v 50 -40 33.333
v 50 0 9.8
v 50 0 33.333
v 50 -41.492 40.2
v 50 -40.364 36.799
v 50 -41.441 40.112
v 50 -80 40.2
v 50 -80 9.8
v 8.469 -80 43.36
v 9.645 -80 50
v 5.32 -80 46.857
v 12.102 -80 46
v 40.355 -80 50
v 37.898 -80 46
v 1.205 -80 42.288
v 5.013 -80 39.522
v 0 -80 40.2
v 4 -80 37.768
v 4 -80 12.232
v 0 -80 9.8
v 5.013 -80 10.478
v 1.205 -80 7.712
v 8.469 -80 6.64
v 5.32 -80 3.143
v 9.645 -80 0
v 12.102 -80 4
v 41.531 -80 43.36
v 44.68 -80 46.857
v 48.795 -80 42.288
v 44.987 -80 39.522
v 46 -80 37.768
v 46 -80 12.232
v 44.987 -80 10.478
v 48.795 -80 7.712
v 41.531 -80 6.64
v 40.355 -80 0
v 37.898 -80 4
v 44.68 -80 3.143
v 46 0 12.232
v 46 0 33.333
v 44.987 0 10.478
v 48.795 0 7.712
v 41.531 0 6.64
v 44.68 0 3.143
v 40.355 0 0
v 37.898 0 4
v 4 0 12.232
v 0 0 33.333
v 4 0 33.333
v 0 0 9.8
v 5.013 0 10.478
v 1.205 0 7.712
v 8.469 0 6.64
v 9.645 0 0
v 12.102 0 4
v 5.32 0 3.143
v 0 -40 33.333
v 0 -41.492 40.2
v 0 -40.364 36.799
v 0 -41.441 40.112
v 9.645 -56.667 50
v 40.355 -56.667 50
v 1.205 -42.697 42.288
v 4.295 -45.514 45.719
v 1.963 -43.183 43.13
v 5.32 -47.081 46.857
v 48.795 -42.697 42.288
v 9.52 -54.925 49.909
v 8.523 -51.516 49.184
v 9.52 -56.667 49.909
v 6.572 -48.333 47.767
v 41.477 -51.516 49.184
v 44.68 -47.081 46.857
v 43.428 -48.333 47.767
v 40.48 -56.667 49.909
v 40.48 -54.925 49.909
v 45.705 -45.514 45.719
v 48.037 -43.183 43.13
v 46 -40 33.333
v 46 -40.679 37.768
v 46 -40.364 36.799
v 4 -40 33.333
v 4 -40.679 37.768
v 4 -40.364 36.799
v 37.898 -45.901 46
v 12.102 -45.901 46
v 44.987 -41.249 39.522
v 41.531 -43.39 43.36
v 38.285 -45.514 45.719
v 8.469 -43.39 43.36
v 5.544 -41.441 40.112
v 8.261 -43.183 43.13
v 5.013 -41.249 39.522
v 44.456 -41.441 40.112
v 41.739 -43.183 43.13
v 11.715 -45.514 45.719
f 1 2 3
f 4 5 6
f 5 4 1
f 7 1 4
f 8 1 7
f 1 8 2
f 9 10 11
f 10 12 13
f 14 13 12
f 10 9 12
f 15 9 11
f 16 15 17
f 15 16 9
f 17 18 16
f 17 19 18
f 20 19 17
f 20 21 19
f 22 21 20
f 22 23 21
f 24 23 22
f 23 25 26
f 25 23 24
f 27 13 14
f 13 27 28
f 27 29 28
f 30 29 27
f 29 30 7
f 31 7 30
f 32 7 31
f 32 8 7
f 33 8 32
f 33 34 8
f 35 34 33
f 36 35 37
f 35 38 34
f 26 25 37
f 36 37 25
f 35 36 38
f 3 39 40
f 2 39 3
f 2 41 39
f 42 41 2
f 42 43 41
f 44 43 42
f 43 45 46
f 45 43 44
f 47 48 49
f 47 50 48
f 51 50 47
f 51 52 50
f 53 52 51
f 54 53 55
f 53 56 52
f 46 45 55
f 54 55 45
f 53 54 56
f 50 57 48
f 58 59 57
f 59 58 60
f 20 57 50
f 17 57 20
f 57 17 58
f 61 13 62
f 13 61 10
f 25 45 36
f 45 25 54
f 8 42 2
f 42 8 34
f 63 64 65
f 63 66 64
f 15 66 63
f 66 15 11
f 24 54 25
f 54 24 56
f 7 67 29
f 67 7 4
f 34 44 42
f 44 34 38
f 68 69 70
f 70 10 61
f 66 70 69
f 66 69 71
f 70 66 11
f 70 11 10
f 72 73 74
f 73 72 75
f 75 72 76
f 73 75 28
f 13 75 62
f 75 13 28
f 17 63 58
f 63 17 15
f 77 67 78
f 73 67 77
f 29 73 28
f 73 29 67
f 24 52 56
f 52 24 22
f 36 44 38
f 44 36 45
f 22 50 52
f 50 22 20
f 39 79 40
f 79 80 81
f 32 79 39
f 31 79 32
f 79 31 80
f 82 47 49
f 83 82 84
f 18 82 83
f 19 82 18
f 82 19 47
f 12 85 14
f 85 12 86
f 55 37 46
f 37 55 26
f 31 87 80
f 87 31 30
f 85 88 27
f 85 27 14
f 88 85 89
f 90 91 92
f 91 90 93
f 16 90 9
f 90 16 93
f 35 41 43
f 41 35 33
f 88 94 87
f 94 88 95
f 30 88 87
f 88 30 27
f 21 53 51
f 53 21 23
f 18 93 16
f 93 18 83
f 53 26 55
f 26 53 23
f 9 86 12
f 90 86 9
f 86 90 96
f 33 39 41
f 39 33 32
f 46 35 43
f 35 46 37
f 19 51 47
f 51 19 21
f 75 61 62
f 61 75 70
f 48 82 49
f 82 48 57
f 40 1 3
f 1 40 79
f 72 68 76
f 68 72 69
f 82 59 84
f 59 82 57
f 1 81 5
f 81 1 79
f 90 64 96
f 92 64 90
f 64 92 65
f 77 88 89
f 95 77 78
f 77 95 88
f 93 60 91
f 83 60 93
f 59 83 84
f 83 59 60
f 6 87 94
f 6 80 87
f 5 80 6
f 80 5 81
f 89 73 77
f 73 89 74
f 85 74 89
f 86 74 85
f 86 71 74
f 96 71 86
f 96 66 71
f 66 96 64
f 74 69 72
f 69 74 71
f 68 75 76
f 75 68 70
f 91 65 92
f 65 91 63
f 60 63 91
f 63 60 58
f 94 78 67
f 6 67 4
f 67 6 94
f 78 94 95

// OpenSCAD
//
//  Copyright (C) 05-11-2012 Jasper den Ouden.
//
//  This is free software: you can redistribute it and/or modify
//  it under the terms of the GNU General Public License as published
//  by the Free Software Foundation, either version 3 of the License, or
//  (at your option) any later verssion.
//

module meh(r,w,h)
{ intersection()
    {
        cube([w,w,h]);
        translate([w/2,w/2]) cylinder(r=r,h=h);
    }
}

w = 50;
Rf = 1.7;
R = w/Rf;
h = 80;

plate_w = 4;

drop = w/3;
hinge_y = h/2;

module body()
{ wi = w-2*plate_w;
  Ri = wi/Rf;
  difference()
  { meh(R,w,h);
    translate([plate_w,plate_w,-h]) meh(Ri,wi,3*h);
    /*  translate([plate_w,plate_w,-h]) intersection()
      { meh(Ri,wi,3*h);
          union()
          { cube([w,w,h+hinge_y]);
            cube([w,w-drop,3*h]);
//            translate([0,w-drop-plate_w,h+hinge_y])
//                  rotate(v=[0,1,0], a=90) cylinder(r=drop-plate_w, h=w);
          }
          }*/
  }
}
//rotate(v=[1,0,0],a=90) body();

rotate(v=[1,0,0],a=90)
difference() 
{ body();
  translate([-w,w-drop,-h+drop]) 
  difference()
  { cube([3*w,3*w,h+hinge_y]);
    translate([0,0,h+hinge_y]) 
        rotate(a=90,v=[0,1,0]) 
        cylinder(r=drop, h=3*w);
  }
}
